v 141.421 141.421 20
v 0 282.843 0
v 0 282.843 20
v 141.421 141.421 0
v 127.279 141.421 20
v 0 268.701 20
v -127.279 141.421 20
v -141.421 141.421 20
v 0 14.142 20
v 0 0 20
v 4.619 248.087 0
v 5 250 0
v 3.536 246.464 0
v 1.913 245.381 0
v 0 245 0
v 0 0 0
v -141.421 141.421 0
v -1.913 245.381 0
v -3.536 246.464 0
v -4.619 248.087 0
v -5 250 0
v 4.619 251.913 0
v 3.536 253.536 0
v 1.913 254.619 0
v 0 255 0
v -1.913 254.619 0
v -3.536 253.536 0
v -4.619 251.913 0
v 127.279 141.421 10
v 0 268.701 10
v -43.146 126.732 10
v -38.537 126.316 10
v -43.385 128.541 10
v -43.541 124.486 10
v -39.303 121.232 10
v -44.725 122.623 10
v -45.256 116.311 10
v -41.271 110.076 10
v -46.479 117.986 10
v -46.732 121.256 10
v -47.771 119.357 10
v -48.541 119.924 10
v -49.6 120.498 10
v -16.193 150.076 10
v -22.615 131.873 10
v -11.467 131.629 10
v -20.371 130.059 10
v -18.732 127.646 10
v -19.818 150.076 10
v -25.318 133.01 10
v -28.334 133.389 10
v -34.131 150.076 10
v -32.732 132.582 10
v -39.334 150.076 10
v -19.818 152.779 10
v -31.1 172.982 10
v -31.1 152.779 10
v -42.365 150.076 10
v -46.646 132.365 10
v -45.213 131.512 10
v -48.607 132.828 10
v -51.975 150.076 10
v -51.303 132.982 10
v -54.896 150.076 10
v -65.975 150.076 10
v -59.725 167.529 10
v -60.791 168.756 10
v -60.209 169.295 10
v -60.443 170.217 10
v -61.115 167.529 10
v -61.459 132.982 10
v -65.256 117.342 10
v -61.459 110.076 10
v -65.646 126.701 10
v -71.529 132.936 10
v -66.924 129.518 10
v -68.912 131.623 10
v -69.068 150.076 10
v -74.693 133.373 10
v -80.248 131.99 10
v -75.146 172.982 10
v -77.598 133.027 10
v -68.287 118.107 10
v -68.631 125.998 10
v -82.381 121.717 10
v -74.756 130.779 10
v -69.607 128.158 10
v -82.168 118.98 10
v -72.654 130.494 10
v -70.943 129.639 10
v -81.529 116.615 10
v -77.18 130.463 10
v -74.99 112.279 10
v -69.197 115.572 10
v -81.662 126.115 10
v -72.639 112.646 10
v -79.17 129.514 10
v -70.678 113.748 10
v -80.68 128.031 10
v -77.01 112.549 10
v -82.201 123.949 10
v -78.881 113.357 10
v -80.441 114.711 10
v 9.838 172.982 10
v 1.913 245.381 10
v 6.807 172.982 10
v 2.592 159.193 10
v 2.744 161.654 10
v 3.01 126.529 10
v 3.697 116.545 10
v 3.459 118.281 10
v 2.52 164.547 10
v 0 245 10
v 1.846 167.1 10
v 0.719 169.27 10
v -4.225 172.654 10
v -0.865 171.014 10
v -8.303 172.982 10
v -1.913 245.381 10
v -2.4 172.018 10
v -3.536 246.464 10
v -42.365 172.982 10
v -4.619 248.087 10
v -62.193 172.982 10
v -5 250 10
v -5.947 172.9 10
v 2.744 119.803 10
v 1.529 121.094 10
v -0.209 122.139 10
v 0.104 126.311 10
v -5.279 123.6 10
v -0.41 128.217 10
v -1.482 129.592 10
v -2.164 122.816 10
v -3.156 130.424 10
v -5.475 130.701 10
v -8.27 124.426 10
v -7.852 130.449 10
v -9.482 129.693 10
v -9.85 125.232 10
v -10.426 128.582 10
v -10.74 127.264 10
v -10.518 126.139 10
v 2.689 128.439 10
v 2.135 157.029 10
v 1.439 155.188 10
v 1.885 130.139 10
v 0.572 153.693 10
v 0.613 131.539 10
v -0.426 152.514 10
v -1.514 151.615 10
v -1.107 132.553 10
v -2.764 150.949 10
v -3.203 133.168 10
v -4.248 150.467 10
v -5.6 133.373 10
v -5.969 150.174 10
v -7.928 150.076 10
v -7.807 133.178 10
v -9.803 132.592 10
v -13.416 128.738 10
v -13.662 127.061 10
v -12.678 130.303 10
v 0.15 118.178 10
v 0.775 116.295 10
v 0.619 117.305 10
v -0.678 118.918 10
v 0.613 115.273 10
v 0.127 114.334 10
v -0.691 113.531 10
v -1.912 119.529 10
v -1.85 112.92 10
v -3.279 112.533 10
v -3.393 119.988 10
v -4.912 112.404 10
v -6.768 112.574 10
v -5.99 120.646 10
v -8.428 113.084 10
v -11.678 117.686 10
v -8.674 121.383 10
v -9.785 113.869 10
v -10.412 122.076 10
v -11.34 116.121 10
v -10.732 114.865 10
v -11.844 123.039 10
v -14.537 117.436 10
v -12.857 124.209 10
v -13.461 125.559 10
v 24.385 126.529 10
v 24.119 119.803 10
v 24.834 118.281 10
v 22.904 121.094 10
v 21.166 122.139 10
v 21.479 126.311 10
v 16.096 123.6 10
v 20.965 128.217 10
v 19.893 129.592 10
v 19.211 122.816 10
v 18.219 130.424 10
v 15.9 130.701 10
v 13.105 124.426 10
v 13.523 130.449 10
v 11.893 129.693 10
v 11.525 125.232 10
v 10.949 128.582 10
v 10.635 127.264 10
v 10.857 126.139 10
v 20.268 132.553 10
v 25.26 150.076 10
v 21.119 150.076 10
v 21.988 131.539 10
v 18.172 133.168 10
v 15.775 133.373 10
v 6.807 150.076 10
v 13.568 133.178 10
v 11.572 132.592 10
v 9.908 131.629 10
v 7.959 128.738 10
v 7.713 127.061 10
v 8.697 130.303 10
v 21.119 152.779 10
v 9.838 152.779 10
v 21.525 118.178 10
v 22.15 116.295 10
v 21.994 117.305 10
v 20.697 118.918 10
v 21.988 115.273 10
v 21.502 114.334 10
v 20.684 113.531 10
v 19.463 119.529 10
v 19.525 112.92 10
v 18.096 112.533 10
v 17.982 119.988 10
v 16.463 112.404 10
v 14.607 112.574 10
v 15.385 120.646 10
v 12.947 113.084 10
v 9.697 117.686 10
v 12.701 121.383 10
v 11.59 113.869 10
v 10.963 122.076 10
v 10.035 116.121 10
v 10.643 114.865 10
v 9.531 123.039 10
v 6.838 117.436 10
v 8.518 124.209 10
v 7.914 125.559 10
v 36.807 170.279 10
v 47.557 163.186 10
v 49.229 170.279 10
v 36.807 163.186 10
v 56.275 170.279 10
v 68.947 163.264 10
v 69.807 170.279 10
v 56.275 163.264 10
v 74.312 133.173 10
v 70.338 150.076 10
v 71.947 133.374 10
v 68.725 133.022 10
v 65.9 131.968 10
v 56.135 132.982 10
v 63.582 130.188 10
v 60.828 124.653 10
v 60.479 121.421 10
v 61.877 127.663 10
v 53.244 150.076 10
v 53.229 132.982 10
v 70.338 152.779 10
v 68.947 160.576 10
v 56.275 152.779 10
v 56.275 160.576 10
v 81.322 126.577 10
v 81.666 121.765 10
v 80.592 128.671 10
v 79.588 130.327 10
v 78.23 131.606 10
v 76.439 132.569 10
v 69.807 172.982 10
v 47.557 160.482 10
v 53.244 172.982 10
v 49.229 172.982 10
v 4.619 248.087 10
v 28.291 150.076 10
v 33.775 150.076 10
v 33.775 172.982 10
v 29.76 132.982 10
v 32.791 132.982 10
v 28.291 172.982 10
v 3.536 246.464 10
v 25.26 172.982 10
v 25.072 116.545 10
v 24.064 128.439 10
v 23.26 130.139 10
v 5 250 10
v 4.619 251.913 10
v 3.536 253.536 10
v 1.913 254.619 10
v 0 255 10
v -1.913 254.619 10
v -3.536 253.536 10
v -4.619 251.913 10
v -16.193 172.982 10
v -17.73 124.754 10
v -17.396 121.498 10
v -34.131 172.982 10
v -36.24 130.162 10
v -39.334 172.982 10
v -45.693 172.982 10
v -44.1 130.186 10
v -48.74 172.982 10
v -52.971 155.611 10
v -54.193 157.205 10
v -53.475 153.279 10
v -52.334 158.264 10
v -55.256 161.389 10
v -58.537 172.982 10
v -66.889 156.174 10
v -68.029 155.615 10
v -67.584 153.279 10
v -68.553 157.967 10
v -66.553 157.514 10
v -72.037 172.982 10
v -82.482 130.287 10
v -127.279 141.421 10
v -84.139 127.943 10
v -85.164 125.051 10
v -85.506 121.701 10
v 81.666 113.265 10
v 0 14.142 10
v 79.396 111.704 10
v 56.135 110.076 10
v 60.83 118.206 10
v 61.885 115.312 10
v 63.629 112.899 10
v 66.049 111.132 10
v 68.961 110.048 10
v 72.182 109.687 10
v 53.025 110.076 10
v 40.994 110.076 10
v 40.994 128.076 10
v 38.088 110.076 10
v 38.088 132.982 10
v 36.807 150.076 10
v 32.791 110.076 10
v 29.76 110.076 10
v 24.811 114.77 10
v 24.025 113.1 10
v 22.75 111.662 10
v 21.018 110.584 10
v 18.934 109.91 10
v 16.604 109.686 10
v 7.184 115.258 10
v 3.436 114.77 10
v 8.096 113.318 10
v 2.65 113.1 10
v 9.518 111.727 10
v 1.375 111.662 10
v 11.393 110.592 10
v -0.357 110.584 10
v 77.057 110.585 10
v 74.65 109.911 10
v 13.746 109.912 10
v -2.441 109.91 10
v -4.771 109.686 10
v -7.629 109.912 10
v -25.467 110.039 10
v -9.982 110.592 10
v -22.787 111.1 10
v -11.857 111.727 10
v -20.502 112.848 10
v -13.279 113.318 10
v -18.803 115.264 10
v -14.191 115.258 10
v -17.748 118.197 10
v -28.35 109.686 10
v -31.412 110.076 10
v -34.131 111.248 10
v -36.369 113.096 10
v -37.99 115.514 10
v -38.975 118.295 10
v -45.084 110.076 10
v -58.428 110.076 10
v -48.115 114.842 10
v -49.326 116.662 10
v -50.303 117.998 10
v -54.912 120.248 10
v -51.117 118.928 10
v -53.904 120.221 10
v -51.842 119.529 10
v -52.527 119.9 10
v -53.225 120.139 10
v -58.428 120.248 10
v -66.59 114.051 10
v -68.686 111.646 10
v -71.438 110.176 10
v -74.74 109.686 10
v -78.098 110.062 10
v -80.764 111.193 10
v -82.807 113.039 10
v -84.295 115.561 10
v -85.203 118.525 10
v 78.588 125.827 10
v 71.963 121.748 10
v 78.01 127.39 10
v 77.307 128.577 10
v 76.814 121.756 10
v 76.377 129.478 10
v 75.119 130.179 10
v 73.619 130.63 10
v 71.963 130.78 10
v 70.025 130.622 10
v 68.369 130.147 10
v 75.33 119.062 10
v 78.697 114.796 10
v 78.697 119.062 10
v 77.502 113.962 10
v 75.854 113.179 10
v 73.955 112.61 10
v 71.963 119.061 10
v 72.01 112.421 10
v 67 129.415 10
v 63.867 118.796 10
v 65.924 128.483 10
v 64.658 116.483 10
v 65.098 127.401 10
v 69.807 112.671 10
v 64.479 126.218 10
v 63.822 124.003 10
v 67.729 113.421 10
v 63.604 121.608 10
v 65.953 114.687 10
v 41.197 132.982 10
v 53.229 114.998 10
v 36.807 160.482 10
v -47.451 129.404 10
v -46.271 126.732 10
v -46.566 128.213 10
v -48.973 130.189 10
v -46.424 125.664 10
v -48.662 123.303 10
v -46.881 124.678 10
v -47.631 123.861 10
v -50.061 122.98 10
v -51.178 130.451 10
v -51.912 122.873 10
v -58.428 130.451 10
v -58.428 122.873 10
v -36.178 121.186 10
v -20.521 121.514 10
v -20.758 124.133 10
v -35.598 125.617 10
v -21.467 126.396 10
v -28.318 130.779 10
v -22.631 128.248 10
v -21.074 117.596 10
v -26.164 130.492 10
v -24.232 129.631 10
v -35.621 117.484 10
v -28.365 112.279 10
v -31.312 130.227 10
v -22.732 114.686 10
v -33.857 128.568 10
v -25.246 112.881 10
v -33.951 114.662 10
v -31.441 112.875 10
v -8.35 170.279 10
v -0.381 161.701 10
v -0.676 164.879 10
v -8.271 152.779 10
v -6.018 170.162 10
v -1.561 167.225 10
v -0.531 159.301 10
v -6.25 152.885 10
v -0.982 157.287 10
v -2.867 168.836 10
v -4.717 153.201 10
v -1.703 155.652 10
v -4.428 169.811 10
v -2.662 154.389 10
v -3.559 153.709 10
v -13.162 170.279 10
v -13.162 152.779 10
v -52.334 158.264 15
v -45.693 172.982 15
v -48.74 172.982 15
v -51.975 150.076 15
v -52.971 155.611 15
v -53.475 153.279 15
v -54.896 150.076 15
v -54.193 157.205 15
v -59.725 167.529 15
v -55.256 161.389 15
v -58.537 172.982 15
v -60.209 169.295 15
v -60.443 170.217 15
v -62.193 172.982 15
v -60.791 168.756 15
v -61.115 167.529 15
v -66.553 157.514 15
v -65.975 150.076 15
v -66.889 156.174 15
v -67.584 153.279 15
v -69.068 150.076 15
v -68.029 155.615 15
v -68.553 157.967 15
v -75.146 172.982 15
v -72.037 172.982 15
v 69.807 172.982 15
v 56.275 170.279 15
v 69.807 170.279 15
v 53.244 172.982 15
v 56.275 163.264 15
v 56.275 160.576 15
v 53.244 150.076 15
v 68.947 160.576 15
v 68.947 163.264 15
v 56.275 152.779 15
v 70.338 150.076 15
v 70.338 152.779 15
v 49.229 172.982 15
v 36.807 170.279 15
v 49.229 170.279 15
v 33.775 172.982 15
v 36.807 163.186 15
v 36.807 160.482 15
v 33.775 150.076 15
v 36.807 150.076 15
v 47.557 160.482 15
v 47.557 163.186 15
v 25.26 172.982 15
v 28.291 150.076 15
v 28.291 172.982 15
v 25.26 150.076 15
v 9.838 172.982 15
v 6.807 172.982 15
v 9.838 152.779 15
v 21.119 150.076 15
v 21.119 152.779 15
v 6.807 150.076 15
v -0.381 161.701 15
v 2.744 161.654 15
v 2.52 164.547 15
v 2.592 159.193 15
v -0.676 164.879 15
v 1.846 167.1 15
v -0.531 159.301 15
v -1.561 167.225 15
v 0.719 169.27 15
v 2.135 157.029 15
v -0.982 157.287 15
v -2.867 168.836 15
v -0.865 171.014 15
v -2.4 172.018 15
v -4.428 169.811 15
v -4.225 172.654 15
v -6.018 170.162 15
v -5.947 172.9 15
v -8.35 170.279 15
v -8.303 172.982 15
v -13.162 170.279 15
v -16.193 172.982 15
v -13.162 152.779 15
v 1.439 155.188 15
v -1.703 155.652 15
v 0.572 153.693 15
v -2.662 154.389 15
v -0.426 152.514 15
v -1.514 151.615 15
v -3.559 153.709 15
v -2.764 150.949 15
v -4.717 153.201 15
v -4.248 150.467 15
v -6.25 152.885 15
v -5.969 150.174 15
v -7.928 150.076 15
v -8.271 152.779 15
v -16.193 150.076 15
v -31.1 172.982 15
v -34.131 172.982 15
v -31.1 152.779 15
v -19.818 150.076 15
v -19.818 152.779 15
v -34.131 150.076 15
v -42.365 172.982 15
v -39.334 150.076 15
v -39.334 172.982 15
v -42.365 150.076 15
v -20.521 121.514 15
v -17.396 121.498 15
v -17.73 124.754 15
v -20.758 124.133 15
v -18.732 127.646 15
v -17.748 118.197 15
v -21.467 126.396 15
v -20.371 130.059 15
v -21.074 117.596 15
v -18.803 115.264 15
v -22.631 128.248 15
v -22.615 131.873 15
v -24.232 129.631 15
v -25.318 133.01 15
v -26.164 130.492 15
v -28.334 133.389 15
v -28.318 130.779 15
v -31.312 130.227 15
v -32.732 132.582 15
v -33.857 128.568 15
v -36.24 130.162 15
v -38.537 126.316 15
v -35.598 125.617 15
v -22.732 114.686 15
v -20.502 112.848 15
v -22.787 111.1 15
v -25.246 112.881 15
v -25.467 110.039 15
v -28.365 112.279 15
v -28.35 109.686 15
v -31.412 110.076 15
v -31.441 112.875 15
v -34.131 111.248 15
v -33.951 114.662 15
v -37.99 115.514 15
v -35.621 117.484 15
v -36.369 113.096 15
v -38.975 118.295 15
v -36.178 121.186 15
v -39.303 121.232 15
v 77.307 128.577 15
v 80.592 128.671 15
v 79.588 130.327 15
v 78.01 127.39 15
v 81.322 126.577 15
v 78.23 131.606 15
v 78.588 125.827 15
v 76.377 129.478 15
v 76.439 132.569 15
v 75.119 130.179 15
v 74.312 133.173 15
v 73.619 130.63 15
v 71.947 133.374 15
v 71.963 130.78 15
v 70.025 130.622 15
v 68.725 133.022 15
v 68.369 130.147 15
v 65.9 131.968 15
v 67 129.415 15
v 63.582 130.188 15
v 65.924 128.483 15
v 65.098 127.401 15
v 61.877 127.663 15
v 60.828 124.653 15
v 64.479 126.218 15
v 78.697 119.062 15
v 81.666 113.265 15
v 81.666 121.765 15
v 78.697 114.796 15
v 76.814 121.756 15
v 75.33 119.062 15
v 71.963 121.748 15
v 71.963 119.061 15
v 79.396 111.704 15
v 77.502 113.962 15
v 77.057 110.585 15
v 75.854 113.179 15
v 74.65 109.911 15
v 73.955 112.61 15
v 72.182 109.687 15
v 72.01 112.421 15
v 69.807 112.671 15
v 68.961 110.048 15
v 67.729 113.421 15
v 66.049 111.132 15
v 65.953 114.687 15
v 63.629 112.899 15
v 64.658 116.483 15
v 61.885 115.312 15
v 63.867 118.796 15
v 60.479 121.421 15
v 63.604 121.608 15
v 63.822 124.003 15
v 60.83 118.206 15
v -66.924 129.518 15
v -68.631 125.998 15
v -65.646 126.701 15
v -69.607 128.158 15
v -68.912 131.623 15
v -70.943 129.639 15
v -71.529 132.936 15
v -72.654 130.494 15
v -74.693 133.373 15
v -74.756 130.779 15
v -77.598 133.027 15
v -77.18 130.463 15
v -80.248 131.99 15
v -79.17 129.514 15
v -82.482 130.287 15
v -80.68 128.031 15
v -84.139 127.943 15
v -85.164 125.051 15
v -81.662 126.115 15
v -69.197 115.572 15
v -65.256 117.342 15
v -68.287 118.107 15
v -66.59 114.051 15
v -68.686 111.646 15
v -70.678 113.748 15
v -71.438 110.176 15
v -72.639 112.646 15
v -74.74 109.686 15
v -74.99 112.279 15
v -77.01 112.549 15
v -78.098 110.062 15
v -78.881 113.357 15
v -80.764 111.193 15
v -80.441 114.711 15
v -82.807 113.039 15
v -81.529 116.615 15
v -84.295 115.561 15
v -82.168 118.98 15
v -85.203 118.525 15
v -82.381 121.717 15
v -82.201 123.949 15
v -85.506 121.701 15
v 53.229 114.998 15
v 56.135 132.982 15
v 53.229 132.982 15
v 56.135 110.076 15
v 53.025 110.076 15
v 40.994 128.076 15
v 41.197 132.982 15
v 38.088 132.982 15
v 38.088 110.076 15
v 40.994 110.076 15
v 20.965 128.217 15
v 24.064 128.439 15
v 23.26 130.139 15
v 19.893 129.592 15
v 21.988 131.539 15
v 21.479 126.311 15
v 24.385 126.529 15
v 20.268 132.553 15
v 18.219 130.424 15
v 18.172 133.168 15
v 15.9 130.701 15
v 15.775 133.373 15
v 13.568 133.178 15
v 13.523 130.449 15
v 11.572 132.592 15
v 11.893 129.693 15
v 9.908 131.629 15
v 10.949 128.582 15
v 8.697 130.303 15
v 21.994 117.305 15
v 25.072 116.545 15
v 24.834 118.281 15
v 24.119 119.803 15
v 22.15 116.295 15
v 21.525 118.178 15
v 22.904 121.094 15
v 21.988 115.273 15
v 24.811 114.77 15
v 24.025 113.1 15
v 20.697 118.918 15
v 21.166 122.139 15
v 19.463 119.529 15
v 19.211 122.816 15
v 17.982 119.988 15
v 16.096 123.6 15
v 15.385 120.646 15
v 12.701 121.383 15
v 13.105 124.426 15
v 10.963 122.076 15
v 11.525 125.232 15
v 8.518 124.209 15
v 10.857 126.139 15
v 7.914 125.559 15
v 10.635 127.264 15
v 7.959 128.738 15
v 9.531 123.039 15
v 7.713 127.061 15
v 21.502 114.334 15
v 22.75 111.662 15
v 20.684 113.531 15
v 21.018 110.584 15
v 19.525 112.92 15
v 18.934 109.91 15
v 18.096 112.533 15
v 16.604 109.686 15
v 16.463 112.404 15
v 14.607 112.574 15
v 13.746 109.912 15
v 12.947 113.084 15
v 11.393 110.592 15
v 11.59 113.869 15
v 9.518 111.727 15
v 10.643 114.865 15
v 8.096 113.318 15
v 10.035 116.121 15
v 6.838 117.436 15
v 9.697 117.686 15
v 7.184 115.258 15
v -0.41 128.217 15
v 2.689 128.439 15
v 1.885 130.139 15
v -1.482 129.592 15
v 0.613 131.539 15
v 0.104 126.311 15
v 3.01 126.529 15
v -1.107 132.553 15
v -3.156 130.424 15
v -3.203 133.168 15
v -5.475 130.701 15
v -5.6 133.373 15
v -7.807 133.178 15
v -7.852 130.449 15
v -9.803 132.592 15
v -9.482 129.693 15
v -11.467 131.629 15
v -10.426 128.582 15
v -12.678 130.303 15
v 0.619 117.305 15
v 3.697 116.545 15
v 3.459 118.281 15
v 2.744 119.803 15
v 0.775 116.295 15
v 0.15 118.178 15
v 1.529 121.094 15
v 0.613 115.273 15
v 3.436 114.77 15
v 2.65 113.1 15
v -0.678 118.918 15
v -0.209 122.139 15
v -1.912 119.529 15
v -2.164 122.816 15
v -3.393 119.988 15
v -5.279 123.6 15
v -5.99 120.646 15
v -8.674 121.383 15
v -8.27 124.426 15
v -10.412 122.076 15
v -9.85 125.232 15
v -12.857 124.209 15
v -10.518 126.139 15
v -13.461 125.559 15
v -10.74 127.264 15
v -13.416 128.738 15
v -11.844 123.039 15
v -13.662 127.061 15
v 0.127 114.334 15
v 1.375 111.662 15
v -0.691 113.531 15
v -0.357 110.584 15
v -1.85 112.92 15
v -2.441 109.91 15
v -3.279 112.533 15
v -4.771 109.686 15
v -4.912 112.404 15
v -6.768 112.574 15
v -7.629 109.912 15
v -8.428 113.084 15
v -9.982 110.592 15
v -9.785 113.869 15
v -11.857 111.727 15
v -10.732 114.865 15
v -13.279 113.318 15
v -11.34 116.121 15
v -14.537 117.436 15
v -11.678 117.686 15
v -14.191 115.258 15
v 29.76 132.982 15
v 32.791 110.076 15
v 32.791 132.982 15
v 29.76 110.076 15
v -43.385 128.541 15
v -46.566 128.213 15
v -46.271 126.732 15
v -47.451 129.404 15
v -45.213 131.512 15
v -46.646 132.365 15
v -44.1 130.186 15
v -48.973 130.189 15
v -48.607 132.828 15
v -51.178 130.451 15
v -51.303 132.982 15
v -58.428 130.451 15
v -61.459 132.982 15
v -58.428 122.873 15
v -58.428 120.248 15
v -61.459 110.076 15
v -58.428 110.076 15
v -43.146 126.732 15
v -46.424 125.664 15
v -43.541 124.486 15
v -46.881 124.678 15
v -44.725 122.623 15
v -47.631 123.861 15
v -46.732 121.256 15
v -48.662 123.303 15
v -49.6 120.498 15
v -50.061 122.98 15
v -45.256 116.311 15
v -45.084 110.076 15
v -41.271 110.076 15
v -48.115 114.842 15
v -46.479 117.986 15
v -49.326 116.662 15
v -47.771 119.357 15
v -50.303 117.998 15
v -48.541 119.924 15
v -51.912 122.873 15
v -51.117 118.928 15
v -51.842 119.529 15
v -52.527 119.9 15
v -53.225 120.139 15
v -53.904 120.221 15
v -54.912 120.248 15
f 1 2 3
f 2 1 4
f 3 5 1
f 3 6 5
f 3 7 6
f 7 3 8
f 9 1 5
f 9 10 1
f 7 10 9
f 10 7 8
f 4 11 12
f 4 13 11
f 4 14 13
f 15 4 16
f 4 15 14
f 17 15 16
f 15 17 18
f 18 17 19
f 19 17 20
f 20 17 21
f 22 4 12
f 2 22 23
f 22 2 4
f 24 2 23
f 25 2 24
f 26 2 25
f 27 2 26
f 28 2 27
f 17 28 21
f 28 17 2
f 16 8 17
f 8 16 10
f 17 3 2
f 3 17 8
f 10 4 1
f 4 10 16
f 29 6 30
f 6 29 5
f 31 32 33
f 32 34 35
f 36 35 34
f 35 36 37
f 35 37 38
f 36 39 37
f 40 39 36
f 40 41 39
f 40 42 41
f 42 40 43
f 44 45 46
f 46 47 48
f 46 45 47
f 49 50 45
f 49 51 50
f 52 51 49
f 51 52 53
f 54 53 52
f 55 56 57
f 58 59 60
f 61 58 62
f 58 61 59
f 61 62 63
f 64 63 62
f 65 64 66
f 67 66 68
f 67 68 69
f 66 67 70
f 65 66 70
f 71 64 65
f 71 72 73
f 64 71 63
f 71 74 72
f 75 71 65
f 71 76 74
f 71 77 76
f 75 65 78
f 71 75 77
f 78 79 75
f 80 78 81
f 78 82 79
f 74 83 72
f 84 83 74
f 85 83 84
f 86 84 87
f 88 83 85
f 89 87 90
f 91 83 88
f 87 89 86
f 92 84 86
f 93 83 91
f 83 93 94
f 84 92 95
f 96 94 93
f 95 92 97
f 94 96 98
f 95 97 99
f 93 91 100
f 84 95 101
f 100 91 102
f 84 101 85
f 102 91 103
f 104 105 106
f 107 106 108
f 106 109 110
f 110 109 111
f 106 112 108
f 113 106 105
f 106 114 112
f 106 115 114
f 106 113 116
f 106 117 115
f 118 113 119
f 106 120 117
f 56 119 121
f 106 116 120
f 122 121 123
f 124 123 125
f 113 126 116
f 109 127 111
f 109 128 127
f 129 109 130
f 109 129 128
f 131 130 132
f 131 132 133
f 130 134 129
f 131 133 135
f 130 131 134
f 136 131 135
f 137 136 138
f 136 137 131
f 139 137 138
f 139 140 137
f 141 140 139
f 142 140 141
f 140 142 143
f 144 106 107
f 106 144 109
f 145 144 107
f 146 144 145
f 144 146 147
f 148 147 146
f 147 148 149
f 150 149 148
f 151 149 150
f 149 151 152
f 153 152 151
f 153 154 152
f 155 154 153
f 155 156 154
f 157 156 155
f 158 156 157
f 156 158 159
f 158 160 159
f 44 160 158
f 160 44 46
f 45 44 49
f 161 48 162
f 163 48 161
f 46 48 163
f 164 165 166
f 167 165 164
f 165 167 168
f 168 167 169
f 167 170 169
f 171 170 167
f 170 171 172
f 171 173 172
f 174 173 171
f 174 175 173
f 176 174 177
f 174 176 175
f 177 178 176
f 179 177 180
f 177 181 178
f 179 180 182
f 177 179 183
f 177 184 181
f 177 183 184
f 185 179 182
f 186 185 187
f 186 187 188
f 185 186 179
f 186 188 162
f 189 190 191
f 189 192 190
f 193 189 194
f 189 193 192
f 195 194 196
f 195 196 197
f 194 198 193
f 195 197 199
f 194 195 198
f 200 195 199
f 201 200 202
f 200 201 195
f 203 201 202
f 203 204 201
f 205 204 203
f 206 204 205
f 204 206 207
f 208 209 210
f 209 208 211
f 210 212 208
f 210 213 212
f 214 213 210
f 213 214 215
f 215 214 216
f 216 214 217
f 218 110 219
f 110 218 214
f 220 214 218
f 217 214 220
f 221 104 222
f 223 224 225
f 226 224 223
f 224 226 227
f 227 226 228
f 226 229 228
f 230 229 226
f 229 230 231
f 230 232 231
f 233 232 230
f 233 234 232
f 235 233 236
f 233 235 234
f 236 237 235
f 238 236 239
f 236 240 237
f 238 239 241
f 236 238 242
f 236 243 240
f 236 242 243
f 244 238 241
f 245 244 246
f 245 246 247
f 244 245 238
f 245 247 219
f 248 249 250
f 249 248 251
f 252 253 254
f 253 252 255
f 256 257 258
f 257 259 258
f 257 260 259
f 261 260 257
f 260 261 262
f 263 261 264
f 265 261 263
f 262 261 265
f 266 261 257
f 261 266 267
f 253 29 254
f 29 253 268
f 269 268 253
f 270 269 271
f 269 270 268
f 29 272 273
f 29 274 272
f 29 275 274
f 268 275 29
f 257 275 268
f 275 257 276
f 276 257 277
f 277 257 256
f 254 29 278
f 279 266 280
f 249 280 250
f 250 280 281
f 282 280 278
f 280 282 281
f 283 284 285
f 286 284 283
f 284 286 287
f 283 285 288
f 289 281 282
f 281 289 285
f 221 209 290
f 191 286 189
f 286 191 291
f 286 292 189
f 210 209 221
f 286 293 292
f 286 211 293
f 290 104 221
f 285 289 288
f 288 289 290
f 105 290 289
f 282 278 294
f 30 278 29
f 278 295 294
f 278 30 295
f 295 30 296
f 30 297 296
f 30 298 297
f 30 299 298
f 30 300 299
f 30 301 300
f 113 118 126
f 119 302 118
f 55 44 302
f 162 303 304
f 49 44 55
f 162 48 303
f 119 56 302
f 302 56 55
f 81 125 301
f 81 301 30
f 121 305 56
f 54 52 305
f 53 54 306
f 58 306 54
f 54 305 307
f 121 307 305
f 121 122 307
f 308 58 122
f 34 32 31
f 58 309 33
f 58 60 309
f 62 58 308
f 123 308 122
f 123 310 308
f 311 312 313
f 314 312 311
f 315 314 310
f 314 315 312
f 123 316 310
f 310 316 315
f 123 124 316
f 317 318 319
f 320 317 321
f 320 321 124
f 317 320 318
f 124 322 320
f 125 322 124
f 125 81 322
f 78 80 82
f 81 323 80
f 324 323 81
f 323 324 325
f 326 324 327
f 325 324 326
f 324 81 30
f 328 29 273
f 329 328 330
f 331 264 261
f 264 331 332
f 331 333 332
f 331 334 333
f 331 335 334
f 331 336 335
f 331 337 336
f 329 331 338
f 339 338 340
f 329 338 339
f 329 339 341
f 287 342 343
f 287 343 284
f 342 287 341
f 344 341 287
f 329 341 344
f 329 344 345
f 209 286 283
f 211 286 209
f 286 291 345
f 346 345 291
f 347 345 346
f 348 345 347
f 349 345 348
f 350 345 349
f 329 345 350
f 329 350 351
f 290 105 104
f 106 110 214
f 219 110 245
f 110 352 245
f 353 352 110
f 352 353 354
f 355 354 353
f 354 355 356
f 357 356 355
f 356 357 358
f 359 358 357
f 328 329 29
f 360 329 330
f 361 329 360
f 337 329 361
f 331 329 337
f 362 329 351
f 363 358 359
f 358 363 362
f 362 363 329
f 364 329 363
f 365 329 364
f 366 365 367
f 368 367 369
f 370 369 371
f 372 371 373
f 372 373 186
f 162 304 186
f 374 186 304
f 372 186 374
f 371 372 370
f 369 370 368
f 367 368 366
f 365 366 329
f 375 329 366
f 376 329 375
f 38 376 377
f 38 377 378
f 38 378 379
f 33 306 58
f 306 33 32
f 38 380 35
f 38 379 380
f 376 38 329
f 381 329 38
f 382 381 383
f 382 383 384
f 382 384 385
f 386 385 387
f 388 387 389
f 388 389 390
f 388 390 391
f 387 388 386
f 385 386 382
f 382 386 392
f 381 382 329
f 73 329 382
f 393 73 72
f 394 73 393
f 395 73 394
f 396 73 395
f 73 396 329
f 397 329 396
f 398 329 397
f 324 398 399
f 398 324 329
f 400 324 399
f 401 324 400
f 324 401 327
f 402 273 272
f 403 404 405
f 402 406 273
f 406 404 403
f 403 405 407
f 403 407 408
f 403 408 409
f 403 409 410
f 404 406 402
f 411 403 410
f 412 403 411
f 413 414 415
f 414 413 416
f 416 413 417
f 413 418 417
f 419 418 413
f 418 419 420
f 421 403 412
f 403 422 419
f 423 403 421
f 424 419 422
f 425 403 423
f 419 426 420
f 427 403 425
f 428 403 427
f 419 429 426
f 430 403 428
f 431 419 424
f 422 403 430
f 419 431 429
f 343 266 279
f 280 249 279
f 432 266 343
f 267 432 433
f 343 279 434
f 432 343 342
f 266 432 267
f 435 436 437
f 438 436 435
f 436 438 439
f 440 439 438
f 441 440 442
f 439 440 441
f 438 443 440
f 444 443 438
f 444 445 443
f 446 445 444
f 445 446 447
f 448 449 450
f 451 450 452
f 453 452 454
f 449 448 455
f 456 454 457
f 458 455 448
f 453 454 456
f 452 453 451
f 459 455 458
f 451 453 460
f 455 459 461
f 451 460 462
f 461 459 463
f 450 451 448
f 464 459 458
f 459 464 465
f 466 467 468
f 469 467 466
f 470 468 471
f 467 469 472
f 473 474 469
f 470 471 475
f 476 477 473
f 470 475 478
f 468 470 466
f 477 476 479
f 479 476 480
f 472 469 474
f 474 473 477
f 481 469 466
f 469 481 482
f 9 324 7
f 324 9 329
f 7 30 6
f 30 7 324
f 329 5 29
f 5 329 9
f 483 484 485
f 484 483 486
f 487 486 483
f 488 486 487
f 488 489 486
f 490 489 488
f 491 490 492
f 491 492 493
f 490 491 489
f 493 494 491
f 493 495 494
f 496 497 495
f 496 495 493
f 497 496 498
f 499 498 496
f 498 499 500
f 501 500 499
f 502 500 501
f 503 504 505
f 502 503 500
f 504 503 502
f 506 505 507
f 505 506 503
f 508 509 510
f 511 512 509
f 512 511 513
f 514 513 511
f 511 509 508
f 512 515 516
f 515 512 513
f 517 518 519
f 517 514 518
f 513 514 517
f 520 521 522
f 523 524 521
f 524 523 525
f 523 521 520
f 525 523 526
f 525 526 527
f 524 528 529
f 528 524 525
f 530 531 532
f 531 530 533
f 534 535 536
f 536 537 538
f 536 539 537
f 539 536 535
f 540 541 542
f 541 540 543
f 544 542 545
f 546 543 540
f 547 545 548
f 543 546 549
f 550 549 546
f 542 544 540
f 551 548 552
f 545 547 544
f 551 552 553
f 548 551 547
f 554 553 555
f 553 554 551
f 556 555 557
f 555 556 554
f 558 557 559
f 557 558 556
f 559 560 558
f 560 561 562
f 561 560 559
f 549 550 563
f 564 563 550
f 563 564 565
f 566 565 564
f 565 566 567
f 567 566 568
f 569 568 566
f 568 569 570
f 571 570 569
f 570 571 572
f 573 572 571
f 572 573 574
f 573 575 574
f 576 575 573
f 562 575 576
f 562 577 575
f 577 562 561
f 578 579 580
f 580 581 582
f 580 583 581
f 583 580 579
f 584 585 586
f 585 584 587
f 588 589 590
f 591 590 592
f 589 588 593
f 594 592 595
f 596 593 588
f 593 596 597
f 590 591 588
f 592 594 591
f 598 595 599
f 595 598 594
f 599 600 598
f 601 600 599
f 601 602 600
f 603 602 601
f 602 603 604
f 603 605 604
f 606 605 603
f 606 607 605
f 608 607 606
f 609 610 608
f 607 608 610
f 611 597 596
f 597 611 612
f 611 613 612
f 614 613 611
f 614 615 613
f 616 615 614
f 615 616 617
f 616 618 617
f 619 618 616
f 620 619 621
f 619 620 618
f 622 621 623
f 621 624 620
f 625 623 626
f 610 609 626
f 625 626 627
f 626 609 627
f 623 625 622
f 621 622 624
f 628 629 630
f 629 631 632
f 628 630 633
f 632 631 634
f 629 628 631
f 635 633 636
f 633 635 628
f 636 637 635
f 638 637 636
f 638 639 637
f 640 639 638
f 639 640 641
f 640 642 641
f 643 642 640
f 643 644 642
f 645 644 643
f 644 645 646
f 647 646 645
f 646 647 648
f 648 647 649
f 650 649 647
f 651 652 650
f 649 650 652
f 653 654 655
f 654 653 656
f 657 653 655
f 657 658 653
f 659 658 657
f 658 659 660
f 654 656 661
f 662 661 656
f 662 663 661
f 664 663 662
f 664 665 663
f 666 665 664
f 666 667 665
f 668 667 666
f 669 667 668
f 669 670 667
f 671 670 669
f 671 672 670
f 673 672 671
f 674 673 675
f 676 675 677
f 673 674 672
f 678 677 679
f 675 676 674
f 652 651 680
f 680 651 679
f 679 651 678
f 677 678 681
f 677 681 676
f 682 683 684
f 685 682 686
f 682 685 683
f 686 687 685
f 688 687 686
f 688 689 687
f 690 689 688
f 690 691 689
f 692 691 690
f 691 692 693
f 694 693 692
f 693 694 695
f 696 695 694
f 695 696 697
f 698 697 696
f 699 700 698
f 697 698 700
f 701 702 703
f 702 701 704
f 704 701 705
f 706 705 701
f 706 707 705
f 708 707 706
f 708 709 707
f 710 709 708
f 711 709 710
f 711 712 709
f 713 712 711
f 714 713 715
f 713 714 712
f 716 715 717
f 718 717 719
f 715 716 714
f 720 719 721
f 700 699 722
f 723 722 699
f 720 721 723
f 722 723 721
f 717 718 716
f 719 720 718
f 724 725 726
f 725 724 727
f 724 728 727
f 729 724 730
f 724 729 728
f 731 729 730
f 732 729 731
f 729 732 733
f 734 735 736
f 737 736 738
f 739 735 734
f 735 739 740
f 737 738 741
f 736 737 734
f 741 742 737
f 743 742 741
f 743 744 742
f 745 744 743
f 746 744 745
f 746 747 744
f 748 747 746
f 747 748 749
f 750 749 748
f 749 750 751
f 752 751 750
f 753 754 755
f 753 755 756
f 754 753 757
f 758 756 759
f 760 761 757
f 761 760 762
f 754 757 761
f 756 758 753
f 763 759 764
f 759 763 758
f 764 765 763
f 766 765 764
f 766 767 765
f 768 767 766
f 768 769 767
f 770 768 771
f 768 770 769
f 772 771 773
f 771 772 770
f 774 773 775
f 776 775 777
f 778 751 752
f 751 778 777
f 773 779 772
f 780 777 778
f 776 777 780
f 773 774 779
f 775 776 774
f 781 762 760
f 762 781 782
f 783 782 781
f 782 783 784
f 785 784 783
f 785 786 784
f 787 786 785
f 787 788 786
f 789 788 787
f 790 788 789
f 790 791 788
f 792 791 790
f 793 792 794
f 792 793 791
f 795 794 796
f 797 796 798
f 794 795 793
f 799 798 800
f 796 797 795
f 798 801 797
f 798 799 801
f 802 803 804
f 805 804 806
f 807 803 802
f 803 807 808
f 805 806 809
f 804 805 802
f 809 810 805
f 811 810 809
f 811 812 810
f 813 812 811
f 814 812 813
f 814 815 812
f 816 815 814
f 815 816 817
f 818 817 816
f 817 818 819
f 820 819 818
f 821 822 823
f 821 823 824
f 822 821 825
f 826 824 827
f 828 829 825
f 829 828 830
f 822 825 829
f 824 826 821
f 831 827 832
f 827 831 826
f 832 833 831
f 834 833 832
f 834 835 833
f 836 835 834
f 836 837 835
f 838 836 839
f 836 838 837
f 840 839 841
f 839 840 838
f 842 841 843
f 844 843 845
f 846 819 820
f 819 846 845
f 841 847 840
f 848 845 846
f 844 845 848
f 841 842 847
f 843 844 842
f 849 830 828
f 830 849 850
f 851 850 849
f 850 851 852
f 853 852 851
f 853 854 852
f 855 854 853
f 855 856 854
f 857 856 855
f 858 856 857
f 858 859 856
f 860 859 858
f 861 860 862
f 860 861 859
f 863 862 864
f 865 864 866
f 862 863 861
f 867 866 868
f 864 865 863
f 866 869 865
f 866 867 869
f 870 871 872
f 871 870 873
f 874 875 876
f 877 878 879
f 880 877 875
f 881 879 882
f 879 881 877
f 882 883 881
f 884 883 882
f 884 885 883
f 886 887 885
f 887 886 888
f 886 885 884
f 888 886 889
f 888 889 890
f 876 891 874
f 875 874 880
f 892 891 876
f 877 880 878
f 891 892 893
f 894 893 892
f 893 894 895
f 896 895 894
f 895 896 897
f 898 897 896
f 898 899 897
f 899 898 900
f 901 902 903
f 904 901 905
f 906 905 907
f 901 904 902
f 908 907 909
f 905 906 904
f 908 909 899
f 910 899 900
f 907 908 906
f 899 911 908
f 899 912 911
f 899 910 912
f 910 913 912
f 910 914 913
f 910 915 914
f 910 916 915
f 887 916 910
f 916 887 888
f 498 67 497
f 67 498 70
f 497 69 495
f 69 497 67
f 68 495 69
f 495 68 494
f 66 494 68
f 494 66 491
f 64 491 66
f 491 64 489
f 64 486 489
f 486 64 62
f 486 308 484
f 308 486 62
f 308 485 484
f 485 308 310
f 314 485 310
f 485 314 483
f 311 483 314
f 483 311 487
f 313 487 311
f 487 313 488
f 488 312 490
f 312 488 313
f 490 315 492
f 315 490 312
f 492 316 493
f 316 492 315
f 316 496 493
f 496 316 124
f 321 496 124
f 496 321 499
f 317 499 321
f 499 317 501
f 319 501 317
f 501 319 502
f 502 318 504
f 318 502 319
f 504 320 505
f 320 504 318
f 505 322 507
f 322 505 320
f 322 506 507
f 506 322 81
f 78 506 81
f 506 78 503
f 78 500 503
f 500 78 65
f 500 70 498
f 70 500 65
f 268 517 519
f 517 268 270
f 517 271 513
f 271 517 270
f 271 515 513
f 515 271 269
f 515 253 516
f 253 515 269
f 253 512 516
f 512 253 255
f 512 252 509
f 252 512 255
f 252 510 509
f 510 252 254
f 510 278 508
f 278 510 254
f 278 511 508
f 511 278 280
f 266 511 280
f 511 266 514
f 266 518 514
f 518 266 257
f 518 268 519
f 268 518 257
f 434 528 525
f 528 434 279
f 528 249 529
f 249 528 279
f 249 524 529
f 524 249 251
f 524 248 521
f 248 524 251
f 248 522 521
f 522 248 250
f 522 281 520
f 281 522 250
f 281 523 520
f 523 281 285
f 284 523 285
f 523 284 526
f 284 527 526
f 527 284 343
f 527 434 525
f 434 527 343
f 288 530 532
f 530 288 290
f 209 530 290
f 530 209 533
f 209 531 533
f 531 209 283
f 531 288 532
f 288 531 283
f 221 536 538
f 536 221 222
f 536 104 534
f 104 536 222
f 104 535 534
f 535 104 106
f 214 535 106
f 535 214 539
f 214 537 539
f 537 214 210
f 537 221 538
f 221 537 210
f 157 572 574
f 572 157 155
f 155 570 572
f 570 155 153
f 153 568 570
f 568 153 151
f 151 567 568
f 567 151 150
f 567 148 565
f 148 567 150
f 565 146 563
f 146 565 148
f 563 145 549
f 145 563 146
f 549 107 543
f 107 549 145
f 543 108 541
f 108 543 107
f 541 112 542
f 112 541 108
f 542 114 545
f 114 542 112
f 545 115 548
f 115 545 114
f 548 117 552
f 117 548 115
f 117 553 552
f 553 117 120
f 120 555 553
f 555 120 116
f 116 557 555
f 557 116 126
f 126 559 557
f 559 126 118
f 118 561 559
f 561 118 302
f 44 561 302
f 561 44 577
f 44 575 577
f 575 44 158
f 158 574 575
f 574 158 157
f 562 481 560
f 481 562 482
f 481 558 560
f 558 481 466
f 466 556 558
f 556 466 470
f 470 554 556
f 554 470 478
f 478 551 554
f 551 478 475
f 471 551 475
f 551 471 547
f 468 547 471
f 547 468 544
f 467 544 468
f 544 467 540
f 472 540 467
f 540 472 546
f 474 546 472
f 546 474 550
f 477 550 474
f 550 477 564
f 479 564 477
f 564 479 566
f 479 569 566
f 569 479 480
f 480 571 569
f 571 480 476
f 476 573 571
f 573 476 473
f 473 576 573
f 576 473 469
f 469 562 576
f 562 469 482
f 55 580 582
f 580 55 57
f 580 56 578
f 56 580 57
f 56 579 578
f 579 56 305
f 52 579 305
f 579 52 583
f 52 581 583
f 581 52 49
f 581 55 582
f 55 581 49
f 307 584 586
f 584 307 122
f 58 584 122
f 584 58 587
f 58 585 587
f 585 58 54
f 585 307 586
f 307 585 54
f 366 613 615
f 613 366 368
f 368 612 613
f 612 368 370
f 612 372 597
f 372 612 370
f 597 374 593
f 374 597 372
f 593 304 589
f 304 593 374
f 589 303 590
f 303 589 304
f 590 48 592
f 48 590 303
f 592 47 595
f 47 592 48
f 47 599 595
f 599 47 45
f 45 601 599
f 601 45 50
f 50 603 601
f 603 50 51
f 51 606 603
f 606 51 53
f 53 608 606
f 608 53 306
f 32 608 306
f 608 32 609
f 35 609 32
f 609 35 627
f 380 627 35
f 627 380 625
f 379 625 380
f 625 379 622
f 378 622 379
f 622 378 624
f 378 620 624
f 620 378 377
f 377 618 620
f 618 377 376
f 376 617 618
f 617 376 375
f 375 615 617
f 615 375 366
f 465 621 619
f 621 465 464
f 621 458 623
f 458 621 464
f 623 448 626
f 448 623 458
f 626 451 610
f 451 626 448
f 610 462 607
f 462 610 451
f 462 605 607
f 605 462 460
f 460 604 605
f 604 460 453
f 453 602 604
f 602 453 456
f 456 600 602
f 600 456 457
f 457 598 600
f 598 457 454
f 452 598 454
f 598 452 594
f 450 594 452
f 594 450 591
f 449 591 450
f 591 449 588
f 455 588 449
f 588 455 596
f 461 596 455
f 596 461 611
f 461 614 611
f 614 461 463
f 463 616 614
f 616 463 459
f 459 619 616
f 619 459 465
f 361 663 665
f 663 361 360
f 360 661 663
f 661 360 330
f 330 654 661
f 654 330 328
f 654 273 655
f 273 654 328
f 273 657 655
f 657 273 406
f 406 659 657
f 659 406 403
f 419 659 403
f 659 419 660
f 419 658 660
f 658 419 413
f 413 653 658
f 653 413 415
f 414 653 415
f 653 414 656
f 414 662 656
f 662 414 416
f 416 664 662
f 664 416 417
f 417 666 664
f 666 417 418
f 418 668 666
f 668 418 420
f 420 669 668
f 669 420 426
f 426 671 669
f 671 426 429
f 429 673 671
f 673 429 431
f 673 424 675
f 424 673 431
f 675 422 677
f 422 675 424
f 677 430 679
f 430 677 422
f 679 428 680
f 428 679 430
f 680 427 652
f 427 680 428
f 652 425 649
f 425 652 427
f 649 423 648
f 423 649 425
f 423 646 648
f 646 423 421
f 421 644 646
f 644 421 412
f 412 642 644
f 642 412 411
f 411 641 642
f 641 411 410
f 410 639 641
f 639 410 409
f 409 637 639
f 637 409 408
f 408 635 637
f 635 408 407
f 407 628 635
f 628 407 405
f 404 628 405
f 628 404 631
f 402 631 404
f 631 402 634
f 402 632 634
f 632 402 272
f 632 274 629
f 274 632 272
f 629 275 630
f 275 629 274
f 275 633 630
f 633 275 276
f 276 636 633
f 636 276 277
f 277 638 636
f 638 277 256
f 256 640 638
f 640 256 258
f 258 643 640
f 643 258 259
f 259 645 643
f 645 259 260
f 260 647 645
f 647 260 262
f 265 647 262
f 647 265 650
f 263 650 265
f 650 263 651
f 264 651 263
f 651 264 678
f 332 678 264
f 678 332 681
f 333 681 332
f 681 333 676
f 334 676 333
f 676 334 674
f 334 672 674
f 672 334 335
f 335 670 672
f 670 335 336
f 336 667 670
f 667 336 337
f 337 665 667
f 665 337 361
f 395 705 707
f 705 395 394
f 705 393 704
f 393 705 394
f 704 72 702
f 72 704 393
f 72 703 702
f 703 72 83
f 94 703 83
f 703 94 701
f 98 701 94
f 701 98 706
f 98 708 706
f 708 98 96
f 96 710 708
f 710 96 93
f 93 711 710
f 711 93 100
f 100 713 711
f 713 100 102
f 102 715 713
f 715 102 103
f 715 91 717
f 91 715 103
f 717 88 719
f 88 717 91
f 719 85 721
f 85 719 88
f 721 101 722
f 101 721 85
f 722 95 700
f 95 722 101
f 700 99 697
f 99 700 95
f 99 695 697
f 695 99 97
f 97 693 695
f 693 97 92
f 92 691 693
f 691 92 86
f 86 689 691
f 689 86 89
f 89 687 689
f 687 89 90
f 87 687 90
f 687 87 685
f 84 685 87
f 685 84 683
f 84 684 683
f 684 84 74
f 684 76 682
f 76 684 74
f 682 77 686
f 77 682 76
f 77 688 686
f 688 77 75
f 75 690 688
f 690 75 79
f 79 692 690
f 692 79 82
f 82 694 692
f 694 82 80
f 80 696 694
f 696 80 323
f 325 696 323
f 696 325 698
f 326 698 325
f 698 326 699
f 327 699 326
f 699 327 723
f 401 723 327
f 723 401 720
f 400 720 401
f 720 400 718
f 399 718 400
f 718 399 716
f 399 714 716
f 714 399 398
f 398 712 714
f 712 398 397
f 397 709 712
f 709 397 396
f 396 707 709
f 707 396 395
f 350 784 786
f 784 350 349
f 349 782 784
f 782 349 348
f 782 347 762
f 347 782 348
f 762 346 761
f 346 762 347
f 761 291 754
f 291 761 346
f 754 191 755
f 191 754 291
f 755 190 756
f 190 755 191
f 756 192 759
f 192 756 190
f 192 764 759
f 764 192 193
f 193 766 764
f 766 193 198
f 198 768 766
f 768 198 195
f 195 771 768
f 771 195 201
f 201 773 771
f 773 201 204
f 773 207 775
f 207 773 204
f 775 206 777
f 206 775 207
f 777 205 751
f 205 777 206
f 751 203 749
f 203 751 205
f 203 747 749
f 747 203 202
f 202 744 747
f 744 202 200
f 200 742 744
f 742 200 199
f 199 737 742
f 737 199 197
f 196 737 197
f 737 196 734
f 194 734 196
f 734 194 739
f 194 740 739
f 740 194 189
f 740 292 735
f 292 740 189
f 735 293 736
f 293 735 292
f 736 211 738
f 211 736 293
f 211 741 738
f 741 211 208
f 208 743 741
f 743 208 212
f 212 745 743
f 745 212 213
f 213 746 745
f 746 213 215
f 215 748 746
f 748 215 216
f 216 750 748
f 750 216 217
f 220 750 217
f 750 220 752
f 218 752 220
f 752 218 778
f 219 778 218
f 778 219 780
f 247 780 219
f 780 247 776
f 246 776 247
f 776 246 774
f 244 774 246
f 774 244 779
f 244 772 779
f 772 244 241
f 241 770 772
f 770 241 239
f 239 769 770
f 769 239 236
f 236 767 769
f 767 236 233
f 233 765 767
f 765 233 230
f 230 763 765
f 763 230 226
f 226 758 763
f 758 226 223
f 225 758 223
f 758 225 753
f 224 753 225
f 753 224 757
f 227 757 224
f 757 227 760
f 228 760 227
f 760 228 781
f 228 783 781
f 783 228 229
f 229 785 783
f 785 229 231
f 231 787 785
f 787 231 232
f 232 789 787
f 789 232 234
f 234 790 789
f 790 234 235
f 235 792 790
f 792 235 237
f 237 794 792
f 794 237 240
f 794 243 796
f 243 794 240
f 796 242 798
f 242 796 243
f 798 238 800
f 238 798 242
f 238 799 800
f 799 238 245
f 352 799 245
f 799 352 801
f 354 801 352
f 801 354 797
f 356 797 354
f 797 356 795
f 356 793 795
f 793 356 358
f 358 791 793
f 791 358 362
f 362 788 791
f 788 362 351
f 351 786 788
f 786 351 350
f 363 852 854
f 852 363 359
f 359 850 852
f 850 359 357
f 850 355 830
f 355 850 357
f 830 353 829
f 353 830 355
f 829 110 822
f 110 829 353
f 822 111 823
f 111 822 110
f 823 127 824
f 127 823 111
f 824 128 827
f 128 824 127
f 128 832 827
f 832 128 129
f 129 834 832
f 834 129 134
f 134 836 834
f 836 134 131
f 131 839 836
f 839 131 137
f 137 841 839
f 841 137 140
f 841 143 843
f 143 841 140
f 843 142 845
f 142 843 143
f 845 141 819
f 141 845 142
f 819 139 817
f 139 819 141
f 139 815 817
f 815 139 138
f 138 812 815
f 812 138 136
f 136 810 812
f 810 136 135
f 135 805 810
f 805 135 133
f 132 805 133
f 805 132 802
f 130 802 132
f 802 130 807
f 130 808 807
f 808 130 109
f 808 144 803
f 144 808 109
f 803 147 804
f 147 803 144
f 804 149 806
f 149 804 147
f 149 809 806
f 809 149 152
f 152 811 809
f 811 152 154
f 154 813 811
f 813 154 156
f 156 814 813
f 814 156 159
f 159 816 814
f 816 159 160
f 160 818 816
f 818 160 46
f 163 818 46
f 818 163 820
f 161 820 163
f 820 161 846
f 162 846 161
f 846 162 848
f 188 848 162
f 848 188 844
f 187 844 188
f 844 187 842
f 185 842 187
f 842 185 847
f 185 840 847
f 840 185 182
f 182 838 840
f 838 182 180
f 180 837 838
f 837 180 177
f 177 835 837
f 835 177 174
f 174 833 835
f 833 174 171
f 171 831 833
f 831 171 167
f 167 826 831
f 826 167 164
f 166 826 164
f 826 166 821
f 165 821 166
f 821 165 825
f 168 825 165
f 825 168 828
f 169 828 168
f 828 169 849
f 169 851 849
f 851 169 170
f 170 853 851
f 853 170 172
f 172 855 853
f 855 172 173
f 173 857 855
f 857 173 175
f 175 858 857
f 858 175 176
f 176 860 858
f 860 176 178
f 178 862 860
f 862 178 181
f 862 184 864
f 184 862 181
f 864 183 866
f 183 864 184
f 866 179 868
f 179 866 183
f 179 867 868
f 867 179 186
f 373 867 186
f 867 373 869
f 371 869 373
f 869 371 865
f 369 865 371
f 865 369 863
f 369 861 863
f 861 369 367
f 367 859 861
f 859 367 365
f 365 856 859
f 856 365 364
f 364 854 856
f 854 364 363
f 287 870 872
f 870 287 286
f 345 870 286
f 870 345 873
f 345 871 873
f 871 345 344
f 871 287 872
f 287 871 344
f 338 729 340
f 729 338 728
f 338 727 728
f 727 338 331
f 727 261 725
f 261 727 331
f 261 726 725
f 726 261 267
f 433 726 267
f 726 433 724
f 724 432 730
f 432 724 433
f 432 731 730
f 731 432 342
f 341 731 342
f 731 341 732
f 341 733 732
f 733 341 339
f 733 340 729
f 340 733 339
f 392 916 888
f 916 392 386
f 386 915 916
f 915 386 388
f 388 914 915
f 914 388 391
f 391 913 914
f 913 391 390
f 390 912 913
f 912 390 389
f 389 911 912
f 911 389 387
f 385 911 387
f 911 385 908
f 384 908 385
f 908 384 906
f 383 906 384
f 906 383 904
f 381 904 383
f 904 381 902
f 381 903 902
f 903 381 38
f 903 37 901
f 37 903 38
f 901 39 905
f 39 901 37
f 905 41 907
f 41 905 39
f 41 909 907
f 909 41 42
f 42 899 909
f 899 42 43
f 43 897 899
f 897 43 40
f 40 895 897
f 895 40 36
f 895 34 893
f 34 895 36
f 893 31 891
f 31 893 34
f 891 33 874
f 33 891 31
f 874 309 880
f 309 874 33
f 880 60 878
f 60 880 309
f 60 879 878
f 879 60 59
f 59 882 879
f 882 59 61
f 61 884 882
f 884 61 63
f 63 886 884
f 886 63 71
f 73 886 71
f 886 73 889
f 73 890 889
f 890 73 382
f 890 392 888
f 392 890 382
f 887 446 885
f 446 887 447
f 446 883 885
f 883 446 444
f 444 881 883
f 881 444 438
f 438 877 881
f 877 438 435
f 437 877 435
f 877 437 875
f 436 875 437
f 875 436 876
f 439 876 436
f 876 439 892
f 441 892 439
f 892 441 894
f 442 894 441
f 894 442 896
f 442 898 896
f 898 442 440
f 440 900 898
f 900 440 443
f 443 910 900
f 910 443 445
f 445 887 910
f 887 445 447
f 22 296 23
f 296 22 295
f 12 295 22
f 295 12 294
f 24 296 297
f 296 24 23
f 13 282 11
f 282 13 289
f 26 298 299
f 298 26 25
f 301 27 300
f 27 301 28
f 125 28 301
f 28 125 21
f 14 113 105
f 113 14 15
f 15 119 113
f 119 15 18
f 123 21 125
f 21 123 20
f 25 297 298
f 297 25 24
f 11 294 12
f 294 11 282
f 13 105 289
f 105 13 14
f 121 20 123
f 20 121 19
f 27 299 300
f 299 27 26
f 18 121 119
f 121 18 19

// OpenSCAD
difference() {
	union() {
		rotate( 45, [0,0,1] )
		difference() {
			cube( [ 200, 200, 20 ] );
			translate([10,10,10]) cube( [ 180, 180, 20 ] );
		}
		
//		translate([-70,100,5])
//		linear_extrude( height=10 ) import( "midlife.dxf" );

		translate([-105,90,5])
		linear_extrude( height=10 ) import( "wildlife.dxf" );
	}
	
	translate([0,250,-5])
	cylinder( r=5, h=20 );
}
